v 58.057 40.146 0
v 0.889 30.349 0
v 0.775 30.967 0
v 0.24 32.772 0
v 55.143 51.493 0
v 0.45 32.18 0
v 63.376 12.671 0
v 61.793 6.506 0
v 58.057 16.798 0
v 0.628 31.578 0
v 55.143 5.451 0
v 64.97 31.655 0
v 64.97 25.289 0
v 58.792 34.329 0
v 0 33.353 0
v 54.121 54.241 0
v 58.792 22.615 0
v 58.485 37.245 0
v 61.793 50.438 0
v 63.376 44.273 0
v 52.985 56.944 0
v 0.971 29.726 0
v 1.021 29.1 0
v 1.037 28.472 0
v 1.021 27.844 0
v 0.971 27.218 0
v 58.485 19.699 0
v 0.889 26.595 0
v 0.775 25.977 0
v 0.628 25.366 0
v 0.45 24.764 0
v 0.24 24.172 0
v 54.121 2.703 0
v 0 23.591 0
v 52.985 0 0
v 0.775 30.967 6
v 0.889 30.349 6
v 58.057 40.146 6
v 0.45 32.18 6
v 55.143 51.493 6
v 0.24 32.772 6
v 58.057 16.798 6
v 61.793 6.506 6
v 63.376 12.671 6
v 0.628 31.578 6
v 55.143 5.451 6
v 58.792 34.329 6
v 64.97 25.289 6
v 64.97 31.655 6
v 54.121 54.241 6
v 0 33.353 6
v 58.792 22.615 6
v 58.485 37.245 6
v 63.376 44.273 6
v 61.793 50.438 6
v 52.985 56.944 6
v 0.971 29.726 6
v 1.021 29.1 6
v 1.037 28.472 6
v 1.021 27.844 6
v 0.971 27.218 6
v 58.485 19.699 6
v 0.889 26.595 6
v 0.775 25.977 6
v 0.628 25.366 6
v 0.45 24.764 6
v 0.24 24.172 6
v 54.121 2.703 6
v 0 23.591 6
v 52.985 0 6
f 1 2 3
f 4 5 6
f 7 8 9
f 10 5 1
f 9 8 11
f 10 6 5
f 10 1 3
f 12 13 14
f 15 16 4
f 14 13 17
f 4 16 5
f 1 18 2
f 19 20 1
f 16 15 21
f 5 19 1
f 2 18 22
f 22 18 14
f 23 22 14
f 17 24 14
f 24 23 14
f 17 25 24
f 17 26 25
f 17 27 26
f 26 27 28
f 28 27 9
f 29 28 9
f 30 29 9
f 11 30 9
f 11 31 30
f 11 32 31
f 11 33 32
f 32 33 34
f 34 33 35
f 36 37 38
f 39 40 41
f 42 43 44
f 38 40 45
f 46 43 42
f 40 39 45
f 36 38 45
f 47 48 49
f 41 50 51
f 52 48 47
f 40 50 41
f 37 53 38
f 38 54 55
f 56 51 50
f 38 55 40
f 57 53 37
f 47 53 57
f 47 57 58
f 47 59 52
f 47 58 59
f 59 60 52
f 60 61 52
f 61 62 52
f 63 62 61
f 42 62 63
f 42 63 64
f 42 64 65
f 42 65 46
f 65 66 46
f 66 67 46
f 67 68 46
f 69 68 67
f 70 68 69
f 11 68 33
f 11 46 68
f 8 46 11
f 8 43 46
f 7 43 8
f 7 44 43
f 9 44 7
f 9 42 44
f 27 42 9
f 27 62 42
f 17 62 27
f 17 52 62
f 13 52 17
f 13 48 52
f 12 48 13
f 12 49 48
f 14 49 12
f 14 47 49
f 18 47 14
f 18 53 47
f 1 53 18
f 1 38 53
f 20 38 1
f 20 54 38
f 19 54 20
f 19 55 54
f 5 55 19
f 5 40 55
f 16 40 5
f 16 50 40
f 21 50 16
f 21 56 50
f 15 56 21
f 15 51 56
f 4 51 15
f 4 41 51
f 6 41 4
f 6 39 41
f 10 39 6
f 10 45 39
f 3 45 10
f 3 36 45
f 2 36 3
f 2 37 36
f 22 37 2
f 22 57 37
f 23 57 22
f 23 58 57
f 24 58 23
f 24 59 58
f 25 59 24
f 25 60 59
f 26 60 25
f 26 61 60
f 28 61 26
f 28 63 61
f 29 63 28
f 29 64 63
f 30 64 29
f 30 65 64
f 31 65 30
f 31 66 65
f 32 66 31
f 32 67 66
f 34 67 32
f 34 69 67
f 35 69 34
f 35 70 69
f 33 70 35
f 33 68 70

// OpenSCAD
$fn = 32;

// ----------------------------------------------------------------------
// Gear sector: 3 teeth on 48 degrees
// ----------------------------------------------------------------------

// --- parameters (mm) ---
sector_angle = 48;        // sector angle, degrees
root_r = 70;              // root circle radius
tooth_h = 6;              // tooth height over the root circle
teeth = 3;                // number of teeth on the sector
hub_r = 12;               // hub bore radius
plate_t = 6;              // sector thickness, Z
arc_step = 3;             // sampling step of the root/hub arcs, degrees

tip_r = root_r + tooth_h;  // tip circle radius

profile = [[52.985, 0], [54.121, 2.703], [55.143, 5.451], [61.793, 6.506], [63.376, 12.671], [58.057, 16.798], [58.485, 19.699], [58.792, 22.615], [64.97, 25.289], [64.97, 31.655], [58.792, 34.329], [58.485, 37.245], [58.057, 40.146], [63.376, 44.273], [61.793, 50.438], [55.143, 51.493], [54.121, 54.241], [52.985, 56.944], [0, 33.353], [0.24, 32.772], [0.45, 32.18], [0.628, 31.578], [0.775, 30.967], [0.889, 30.349], [0.971, 29.726], [1.021, 29.1], [1.037, 28.472], [1.021, 27.844], [0.971, 27.218], [0.889, 26.595], [0.775, 25.977], [0.628, 25.366], [0.45, 24.764], [0.24, 24.172], [0, 23.591]];  // primary outline, 35 points, counter clockwise

// --- the one profile operation ---
linear_extrude(height = plate_t) polygon(points = profile);
